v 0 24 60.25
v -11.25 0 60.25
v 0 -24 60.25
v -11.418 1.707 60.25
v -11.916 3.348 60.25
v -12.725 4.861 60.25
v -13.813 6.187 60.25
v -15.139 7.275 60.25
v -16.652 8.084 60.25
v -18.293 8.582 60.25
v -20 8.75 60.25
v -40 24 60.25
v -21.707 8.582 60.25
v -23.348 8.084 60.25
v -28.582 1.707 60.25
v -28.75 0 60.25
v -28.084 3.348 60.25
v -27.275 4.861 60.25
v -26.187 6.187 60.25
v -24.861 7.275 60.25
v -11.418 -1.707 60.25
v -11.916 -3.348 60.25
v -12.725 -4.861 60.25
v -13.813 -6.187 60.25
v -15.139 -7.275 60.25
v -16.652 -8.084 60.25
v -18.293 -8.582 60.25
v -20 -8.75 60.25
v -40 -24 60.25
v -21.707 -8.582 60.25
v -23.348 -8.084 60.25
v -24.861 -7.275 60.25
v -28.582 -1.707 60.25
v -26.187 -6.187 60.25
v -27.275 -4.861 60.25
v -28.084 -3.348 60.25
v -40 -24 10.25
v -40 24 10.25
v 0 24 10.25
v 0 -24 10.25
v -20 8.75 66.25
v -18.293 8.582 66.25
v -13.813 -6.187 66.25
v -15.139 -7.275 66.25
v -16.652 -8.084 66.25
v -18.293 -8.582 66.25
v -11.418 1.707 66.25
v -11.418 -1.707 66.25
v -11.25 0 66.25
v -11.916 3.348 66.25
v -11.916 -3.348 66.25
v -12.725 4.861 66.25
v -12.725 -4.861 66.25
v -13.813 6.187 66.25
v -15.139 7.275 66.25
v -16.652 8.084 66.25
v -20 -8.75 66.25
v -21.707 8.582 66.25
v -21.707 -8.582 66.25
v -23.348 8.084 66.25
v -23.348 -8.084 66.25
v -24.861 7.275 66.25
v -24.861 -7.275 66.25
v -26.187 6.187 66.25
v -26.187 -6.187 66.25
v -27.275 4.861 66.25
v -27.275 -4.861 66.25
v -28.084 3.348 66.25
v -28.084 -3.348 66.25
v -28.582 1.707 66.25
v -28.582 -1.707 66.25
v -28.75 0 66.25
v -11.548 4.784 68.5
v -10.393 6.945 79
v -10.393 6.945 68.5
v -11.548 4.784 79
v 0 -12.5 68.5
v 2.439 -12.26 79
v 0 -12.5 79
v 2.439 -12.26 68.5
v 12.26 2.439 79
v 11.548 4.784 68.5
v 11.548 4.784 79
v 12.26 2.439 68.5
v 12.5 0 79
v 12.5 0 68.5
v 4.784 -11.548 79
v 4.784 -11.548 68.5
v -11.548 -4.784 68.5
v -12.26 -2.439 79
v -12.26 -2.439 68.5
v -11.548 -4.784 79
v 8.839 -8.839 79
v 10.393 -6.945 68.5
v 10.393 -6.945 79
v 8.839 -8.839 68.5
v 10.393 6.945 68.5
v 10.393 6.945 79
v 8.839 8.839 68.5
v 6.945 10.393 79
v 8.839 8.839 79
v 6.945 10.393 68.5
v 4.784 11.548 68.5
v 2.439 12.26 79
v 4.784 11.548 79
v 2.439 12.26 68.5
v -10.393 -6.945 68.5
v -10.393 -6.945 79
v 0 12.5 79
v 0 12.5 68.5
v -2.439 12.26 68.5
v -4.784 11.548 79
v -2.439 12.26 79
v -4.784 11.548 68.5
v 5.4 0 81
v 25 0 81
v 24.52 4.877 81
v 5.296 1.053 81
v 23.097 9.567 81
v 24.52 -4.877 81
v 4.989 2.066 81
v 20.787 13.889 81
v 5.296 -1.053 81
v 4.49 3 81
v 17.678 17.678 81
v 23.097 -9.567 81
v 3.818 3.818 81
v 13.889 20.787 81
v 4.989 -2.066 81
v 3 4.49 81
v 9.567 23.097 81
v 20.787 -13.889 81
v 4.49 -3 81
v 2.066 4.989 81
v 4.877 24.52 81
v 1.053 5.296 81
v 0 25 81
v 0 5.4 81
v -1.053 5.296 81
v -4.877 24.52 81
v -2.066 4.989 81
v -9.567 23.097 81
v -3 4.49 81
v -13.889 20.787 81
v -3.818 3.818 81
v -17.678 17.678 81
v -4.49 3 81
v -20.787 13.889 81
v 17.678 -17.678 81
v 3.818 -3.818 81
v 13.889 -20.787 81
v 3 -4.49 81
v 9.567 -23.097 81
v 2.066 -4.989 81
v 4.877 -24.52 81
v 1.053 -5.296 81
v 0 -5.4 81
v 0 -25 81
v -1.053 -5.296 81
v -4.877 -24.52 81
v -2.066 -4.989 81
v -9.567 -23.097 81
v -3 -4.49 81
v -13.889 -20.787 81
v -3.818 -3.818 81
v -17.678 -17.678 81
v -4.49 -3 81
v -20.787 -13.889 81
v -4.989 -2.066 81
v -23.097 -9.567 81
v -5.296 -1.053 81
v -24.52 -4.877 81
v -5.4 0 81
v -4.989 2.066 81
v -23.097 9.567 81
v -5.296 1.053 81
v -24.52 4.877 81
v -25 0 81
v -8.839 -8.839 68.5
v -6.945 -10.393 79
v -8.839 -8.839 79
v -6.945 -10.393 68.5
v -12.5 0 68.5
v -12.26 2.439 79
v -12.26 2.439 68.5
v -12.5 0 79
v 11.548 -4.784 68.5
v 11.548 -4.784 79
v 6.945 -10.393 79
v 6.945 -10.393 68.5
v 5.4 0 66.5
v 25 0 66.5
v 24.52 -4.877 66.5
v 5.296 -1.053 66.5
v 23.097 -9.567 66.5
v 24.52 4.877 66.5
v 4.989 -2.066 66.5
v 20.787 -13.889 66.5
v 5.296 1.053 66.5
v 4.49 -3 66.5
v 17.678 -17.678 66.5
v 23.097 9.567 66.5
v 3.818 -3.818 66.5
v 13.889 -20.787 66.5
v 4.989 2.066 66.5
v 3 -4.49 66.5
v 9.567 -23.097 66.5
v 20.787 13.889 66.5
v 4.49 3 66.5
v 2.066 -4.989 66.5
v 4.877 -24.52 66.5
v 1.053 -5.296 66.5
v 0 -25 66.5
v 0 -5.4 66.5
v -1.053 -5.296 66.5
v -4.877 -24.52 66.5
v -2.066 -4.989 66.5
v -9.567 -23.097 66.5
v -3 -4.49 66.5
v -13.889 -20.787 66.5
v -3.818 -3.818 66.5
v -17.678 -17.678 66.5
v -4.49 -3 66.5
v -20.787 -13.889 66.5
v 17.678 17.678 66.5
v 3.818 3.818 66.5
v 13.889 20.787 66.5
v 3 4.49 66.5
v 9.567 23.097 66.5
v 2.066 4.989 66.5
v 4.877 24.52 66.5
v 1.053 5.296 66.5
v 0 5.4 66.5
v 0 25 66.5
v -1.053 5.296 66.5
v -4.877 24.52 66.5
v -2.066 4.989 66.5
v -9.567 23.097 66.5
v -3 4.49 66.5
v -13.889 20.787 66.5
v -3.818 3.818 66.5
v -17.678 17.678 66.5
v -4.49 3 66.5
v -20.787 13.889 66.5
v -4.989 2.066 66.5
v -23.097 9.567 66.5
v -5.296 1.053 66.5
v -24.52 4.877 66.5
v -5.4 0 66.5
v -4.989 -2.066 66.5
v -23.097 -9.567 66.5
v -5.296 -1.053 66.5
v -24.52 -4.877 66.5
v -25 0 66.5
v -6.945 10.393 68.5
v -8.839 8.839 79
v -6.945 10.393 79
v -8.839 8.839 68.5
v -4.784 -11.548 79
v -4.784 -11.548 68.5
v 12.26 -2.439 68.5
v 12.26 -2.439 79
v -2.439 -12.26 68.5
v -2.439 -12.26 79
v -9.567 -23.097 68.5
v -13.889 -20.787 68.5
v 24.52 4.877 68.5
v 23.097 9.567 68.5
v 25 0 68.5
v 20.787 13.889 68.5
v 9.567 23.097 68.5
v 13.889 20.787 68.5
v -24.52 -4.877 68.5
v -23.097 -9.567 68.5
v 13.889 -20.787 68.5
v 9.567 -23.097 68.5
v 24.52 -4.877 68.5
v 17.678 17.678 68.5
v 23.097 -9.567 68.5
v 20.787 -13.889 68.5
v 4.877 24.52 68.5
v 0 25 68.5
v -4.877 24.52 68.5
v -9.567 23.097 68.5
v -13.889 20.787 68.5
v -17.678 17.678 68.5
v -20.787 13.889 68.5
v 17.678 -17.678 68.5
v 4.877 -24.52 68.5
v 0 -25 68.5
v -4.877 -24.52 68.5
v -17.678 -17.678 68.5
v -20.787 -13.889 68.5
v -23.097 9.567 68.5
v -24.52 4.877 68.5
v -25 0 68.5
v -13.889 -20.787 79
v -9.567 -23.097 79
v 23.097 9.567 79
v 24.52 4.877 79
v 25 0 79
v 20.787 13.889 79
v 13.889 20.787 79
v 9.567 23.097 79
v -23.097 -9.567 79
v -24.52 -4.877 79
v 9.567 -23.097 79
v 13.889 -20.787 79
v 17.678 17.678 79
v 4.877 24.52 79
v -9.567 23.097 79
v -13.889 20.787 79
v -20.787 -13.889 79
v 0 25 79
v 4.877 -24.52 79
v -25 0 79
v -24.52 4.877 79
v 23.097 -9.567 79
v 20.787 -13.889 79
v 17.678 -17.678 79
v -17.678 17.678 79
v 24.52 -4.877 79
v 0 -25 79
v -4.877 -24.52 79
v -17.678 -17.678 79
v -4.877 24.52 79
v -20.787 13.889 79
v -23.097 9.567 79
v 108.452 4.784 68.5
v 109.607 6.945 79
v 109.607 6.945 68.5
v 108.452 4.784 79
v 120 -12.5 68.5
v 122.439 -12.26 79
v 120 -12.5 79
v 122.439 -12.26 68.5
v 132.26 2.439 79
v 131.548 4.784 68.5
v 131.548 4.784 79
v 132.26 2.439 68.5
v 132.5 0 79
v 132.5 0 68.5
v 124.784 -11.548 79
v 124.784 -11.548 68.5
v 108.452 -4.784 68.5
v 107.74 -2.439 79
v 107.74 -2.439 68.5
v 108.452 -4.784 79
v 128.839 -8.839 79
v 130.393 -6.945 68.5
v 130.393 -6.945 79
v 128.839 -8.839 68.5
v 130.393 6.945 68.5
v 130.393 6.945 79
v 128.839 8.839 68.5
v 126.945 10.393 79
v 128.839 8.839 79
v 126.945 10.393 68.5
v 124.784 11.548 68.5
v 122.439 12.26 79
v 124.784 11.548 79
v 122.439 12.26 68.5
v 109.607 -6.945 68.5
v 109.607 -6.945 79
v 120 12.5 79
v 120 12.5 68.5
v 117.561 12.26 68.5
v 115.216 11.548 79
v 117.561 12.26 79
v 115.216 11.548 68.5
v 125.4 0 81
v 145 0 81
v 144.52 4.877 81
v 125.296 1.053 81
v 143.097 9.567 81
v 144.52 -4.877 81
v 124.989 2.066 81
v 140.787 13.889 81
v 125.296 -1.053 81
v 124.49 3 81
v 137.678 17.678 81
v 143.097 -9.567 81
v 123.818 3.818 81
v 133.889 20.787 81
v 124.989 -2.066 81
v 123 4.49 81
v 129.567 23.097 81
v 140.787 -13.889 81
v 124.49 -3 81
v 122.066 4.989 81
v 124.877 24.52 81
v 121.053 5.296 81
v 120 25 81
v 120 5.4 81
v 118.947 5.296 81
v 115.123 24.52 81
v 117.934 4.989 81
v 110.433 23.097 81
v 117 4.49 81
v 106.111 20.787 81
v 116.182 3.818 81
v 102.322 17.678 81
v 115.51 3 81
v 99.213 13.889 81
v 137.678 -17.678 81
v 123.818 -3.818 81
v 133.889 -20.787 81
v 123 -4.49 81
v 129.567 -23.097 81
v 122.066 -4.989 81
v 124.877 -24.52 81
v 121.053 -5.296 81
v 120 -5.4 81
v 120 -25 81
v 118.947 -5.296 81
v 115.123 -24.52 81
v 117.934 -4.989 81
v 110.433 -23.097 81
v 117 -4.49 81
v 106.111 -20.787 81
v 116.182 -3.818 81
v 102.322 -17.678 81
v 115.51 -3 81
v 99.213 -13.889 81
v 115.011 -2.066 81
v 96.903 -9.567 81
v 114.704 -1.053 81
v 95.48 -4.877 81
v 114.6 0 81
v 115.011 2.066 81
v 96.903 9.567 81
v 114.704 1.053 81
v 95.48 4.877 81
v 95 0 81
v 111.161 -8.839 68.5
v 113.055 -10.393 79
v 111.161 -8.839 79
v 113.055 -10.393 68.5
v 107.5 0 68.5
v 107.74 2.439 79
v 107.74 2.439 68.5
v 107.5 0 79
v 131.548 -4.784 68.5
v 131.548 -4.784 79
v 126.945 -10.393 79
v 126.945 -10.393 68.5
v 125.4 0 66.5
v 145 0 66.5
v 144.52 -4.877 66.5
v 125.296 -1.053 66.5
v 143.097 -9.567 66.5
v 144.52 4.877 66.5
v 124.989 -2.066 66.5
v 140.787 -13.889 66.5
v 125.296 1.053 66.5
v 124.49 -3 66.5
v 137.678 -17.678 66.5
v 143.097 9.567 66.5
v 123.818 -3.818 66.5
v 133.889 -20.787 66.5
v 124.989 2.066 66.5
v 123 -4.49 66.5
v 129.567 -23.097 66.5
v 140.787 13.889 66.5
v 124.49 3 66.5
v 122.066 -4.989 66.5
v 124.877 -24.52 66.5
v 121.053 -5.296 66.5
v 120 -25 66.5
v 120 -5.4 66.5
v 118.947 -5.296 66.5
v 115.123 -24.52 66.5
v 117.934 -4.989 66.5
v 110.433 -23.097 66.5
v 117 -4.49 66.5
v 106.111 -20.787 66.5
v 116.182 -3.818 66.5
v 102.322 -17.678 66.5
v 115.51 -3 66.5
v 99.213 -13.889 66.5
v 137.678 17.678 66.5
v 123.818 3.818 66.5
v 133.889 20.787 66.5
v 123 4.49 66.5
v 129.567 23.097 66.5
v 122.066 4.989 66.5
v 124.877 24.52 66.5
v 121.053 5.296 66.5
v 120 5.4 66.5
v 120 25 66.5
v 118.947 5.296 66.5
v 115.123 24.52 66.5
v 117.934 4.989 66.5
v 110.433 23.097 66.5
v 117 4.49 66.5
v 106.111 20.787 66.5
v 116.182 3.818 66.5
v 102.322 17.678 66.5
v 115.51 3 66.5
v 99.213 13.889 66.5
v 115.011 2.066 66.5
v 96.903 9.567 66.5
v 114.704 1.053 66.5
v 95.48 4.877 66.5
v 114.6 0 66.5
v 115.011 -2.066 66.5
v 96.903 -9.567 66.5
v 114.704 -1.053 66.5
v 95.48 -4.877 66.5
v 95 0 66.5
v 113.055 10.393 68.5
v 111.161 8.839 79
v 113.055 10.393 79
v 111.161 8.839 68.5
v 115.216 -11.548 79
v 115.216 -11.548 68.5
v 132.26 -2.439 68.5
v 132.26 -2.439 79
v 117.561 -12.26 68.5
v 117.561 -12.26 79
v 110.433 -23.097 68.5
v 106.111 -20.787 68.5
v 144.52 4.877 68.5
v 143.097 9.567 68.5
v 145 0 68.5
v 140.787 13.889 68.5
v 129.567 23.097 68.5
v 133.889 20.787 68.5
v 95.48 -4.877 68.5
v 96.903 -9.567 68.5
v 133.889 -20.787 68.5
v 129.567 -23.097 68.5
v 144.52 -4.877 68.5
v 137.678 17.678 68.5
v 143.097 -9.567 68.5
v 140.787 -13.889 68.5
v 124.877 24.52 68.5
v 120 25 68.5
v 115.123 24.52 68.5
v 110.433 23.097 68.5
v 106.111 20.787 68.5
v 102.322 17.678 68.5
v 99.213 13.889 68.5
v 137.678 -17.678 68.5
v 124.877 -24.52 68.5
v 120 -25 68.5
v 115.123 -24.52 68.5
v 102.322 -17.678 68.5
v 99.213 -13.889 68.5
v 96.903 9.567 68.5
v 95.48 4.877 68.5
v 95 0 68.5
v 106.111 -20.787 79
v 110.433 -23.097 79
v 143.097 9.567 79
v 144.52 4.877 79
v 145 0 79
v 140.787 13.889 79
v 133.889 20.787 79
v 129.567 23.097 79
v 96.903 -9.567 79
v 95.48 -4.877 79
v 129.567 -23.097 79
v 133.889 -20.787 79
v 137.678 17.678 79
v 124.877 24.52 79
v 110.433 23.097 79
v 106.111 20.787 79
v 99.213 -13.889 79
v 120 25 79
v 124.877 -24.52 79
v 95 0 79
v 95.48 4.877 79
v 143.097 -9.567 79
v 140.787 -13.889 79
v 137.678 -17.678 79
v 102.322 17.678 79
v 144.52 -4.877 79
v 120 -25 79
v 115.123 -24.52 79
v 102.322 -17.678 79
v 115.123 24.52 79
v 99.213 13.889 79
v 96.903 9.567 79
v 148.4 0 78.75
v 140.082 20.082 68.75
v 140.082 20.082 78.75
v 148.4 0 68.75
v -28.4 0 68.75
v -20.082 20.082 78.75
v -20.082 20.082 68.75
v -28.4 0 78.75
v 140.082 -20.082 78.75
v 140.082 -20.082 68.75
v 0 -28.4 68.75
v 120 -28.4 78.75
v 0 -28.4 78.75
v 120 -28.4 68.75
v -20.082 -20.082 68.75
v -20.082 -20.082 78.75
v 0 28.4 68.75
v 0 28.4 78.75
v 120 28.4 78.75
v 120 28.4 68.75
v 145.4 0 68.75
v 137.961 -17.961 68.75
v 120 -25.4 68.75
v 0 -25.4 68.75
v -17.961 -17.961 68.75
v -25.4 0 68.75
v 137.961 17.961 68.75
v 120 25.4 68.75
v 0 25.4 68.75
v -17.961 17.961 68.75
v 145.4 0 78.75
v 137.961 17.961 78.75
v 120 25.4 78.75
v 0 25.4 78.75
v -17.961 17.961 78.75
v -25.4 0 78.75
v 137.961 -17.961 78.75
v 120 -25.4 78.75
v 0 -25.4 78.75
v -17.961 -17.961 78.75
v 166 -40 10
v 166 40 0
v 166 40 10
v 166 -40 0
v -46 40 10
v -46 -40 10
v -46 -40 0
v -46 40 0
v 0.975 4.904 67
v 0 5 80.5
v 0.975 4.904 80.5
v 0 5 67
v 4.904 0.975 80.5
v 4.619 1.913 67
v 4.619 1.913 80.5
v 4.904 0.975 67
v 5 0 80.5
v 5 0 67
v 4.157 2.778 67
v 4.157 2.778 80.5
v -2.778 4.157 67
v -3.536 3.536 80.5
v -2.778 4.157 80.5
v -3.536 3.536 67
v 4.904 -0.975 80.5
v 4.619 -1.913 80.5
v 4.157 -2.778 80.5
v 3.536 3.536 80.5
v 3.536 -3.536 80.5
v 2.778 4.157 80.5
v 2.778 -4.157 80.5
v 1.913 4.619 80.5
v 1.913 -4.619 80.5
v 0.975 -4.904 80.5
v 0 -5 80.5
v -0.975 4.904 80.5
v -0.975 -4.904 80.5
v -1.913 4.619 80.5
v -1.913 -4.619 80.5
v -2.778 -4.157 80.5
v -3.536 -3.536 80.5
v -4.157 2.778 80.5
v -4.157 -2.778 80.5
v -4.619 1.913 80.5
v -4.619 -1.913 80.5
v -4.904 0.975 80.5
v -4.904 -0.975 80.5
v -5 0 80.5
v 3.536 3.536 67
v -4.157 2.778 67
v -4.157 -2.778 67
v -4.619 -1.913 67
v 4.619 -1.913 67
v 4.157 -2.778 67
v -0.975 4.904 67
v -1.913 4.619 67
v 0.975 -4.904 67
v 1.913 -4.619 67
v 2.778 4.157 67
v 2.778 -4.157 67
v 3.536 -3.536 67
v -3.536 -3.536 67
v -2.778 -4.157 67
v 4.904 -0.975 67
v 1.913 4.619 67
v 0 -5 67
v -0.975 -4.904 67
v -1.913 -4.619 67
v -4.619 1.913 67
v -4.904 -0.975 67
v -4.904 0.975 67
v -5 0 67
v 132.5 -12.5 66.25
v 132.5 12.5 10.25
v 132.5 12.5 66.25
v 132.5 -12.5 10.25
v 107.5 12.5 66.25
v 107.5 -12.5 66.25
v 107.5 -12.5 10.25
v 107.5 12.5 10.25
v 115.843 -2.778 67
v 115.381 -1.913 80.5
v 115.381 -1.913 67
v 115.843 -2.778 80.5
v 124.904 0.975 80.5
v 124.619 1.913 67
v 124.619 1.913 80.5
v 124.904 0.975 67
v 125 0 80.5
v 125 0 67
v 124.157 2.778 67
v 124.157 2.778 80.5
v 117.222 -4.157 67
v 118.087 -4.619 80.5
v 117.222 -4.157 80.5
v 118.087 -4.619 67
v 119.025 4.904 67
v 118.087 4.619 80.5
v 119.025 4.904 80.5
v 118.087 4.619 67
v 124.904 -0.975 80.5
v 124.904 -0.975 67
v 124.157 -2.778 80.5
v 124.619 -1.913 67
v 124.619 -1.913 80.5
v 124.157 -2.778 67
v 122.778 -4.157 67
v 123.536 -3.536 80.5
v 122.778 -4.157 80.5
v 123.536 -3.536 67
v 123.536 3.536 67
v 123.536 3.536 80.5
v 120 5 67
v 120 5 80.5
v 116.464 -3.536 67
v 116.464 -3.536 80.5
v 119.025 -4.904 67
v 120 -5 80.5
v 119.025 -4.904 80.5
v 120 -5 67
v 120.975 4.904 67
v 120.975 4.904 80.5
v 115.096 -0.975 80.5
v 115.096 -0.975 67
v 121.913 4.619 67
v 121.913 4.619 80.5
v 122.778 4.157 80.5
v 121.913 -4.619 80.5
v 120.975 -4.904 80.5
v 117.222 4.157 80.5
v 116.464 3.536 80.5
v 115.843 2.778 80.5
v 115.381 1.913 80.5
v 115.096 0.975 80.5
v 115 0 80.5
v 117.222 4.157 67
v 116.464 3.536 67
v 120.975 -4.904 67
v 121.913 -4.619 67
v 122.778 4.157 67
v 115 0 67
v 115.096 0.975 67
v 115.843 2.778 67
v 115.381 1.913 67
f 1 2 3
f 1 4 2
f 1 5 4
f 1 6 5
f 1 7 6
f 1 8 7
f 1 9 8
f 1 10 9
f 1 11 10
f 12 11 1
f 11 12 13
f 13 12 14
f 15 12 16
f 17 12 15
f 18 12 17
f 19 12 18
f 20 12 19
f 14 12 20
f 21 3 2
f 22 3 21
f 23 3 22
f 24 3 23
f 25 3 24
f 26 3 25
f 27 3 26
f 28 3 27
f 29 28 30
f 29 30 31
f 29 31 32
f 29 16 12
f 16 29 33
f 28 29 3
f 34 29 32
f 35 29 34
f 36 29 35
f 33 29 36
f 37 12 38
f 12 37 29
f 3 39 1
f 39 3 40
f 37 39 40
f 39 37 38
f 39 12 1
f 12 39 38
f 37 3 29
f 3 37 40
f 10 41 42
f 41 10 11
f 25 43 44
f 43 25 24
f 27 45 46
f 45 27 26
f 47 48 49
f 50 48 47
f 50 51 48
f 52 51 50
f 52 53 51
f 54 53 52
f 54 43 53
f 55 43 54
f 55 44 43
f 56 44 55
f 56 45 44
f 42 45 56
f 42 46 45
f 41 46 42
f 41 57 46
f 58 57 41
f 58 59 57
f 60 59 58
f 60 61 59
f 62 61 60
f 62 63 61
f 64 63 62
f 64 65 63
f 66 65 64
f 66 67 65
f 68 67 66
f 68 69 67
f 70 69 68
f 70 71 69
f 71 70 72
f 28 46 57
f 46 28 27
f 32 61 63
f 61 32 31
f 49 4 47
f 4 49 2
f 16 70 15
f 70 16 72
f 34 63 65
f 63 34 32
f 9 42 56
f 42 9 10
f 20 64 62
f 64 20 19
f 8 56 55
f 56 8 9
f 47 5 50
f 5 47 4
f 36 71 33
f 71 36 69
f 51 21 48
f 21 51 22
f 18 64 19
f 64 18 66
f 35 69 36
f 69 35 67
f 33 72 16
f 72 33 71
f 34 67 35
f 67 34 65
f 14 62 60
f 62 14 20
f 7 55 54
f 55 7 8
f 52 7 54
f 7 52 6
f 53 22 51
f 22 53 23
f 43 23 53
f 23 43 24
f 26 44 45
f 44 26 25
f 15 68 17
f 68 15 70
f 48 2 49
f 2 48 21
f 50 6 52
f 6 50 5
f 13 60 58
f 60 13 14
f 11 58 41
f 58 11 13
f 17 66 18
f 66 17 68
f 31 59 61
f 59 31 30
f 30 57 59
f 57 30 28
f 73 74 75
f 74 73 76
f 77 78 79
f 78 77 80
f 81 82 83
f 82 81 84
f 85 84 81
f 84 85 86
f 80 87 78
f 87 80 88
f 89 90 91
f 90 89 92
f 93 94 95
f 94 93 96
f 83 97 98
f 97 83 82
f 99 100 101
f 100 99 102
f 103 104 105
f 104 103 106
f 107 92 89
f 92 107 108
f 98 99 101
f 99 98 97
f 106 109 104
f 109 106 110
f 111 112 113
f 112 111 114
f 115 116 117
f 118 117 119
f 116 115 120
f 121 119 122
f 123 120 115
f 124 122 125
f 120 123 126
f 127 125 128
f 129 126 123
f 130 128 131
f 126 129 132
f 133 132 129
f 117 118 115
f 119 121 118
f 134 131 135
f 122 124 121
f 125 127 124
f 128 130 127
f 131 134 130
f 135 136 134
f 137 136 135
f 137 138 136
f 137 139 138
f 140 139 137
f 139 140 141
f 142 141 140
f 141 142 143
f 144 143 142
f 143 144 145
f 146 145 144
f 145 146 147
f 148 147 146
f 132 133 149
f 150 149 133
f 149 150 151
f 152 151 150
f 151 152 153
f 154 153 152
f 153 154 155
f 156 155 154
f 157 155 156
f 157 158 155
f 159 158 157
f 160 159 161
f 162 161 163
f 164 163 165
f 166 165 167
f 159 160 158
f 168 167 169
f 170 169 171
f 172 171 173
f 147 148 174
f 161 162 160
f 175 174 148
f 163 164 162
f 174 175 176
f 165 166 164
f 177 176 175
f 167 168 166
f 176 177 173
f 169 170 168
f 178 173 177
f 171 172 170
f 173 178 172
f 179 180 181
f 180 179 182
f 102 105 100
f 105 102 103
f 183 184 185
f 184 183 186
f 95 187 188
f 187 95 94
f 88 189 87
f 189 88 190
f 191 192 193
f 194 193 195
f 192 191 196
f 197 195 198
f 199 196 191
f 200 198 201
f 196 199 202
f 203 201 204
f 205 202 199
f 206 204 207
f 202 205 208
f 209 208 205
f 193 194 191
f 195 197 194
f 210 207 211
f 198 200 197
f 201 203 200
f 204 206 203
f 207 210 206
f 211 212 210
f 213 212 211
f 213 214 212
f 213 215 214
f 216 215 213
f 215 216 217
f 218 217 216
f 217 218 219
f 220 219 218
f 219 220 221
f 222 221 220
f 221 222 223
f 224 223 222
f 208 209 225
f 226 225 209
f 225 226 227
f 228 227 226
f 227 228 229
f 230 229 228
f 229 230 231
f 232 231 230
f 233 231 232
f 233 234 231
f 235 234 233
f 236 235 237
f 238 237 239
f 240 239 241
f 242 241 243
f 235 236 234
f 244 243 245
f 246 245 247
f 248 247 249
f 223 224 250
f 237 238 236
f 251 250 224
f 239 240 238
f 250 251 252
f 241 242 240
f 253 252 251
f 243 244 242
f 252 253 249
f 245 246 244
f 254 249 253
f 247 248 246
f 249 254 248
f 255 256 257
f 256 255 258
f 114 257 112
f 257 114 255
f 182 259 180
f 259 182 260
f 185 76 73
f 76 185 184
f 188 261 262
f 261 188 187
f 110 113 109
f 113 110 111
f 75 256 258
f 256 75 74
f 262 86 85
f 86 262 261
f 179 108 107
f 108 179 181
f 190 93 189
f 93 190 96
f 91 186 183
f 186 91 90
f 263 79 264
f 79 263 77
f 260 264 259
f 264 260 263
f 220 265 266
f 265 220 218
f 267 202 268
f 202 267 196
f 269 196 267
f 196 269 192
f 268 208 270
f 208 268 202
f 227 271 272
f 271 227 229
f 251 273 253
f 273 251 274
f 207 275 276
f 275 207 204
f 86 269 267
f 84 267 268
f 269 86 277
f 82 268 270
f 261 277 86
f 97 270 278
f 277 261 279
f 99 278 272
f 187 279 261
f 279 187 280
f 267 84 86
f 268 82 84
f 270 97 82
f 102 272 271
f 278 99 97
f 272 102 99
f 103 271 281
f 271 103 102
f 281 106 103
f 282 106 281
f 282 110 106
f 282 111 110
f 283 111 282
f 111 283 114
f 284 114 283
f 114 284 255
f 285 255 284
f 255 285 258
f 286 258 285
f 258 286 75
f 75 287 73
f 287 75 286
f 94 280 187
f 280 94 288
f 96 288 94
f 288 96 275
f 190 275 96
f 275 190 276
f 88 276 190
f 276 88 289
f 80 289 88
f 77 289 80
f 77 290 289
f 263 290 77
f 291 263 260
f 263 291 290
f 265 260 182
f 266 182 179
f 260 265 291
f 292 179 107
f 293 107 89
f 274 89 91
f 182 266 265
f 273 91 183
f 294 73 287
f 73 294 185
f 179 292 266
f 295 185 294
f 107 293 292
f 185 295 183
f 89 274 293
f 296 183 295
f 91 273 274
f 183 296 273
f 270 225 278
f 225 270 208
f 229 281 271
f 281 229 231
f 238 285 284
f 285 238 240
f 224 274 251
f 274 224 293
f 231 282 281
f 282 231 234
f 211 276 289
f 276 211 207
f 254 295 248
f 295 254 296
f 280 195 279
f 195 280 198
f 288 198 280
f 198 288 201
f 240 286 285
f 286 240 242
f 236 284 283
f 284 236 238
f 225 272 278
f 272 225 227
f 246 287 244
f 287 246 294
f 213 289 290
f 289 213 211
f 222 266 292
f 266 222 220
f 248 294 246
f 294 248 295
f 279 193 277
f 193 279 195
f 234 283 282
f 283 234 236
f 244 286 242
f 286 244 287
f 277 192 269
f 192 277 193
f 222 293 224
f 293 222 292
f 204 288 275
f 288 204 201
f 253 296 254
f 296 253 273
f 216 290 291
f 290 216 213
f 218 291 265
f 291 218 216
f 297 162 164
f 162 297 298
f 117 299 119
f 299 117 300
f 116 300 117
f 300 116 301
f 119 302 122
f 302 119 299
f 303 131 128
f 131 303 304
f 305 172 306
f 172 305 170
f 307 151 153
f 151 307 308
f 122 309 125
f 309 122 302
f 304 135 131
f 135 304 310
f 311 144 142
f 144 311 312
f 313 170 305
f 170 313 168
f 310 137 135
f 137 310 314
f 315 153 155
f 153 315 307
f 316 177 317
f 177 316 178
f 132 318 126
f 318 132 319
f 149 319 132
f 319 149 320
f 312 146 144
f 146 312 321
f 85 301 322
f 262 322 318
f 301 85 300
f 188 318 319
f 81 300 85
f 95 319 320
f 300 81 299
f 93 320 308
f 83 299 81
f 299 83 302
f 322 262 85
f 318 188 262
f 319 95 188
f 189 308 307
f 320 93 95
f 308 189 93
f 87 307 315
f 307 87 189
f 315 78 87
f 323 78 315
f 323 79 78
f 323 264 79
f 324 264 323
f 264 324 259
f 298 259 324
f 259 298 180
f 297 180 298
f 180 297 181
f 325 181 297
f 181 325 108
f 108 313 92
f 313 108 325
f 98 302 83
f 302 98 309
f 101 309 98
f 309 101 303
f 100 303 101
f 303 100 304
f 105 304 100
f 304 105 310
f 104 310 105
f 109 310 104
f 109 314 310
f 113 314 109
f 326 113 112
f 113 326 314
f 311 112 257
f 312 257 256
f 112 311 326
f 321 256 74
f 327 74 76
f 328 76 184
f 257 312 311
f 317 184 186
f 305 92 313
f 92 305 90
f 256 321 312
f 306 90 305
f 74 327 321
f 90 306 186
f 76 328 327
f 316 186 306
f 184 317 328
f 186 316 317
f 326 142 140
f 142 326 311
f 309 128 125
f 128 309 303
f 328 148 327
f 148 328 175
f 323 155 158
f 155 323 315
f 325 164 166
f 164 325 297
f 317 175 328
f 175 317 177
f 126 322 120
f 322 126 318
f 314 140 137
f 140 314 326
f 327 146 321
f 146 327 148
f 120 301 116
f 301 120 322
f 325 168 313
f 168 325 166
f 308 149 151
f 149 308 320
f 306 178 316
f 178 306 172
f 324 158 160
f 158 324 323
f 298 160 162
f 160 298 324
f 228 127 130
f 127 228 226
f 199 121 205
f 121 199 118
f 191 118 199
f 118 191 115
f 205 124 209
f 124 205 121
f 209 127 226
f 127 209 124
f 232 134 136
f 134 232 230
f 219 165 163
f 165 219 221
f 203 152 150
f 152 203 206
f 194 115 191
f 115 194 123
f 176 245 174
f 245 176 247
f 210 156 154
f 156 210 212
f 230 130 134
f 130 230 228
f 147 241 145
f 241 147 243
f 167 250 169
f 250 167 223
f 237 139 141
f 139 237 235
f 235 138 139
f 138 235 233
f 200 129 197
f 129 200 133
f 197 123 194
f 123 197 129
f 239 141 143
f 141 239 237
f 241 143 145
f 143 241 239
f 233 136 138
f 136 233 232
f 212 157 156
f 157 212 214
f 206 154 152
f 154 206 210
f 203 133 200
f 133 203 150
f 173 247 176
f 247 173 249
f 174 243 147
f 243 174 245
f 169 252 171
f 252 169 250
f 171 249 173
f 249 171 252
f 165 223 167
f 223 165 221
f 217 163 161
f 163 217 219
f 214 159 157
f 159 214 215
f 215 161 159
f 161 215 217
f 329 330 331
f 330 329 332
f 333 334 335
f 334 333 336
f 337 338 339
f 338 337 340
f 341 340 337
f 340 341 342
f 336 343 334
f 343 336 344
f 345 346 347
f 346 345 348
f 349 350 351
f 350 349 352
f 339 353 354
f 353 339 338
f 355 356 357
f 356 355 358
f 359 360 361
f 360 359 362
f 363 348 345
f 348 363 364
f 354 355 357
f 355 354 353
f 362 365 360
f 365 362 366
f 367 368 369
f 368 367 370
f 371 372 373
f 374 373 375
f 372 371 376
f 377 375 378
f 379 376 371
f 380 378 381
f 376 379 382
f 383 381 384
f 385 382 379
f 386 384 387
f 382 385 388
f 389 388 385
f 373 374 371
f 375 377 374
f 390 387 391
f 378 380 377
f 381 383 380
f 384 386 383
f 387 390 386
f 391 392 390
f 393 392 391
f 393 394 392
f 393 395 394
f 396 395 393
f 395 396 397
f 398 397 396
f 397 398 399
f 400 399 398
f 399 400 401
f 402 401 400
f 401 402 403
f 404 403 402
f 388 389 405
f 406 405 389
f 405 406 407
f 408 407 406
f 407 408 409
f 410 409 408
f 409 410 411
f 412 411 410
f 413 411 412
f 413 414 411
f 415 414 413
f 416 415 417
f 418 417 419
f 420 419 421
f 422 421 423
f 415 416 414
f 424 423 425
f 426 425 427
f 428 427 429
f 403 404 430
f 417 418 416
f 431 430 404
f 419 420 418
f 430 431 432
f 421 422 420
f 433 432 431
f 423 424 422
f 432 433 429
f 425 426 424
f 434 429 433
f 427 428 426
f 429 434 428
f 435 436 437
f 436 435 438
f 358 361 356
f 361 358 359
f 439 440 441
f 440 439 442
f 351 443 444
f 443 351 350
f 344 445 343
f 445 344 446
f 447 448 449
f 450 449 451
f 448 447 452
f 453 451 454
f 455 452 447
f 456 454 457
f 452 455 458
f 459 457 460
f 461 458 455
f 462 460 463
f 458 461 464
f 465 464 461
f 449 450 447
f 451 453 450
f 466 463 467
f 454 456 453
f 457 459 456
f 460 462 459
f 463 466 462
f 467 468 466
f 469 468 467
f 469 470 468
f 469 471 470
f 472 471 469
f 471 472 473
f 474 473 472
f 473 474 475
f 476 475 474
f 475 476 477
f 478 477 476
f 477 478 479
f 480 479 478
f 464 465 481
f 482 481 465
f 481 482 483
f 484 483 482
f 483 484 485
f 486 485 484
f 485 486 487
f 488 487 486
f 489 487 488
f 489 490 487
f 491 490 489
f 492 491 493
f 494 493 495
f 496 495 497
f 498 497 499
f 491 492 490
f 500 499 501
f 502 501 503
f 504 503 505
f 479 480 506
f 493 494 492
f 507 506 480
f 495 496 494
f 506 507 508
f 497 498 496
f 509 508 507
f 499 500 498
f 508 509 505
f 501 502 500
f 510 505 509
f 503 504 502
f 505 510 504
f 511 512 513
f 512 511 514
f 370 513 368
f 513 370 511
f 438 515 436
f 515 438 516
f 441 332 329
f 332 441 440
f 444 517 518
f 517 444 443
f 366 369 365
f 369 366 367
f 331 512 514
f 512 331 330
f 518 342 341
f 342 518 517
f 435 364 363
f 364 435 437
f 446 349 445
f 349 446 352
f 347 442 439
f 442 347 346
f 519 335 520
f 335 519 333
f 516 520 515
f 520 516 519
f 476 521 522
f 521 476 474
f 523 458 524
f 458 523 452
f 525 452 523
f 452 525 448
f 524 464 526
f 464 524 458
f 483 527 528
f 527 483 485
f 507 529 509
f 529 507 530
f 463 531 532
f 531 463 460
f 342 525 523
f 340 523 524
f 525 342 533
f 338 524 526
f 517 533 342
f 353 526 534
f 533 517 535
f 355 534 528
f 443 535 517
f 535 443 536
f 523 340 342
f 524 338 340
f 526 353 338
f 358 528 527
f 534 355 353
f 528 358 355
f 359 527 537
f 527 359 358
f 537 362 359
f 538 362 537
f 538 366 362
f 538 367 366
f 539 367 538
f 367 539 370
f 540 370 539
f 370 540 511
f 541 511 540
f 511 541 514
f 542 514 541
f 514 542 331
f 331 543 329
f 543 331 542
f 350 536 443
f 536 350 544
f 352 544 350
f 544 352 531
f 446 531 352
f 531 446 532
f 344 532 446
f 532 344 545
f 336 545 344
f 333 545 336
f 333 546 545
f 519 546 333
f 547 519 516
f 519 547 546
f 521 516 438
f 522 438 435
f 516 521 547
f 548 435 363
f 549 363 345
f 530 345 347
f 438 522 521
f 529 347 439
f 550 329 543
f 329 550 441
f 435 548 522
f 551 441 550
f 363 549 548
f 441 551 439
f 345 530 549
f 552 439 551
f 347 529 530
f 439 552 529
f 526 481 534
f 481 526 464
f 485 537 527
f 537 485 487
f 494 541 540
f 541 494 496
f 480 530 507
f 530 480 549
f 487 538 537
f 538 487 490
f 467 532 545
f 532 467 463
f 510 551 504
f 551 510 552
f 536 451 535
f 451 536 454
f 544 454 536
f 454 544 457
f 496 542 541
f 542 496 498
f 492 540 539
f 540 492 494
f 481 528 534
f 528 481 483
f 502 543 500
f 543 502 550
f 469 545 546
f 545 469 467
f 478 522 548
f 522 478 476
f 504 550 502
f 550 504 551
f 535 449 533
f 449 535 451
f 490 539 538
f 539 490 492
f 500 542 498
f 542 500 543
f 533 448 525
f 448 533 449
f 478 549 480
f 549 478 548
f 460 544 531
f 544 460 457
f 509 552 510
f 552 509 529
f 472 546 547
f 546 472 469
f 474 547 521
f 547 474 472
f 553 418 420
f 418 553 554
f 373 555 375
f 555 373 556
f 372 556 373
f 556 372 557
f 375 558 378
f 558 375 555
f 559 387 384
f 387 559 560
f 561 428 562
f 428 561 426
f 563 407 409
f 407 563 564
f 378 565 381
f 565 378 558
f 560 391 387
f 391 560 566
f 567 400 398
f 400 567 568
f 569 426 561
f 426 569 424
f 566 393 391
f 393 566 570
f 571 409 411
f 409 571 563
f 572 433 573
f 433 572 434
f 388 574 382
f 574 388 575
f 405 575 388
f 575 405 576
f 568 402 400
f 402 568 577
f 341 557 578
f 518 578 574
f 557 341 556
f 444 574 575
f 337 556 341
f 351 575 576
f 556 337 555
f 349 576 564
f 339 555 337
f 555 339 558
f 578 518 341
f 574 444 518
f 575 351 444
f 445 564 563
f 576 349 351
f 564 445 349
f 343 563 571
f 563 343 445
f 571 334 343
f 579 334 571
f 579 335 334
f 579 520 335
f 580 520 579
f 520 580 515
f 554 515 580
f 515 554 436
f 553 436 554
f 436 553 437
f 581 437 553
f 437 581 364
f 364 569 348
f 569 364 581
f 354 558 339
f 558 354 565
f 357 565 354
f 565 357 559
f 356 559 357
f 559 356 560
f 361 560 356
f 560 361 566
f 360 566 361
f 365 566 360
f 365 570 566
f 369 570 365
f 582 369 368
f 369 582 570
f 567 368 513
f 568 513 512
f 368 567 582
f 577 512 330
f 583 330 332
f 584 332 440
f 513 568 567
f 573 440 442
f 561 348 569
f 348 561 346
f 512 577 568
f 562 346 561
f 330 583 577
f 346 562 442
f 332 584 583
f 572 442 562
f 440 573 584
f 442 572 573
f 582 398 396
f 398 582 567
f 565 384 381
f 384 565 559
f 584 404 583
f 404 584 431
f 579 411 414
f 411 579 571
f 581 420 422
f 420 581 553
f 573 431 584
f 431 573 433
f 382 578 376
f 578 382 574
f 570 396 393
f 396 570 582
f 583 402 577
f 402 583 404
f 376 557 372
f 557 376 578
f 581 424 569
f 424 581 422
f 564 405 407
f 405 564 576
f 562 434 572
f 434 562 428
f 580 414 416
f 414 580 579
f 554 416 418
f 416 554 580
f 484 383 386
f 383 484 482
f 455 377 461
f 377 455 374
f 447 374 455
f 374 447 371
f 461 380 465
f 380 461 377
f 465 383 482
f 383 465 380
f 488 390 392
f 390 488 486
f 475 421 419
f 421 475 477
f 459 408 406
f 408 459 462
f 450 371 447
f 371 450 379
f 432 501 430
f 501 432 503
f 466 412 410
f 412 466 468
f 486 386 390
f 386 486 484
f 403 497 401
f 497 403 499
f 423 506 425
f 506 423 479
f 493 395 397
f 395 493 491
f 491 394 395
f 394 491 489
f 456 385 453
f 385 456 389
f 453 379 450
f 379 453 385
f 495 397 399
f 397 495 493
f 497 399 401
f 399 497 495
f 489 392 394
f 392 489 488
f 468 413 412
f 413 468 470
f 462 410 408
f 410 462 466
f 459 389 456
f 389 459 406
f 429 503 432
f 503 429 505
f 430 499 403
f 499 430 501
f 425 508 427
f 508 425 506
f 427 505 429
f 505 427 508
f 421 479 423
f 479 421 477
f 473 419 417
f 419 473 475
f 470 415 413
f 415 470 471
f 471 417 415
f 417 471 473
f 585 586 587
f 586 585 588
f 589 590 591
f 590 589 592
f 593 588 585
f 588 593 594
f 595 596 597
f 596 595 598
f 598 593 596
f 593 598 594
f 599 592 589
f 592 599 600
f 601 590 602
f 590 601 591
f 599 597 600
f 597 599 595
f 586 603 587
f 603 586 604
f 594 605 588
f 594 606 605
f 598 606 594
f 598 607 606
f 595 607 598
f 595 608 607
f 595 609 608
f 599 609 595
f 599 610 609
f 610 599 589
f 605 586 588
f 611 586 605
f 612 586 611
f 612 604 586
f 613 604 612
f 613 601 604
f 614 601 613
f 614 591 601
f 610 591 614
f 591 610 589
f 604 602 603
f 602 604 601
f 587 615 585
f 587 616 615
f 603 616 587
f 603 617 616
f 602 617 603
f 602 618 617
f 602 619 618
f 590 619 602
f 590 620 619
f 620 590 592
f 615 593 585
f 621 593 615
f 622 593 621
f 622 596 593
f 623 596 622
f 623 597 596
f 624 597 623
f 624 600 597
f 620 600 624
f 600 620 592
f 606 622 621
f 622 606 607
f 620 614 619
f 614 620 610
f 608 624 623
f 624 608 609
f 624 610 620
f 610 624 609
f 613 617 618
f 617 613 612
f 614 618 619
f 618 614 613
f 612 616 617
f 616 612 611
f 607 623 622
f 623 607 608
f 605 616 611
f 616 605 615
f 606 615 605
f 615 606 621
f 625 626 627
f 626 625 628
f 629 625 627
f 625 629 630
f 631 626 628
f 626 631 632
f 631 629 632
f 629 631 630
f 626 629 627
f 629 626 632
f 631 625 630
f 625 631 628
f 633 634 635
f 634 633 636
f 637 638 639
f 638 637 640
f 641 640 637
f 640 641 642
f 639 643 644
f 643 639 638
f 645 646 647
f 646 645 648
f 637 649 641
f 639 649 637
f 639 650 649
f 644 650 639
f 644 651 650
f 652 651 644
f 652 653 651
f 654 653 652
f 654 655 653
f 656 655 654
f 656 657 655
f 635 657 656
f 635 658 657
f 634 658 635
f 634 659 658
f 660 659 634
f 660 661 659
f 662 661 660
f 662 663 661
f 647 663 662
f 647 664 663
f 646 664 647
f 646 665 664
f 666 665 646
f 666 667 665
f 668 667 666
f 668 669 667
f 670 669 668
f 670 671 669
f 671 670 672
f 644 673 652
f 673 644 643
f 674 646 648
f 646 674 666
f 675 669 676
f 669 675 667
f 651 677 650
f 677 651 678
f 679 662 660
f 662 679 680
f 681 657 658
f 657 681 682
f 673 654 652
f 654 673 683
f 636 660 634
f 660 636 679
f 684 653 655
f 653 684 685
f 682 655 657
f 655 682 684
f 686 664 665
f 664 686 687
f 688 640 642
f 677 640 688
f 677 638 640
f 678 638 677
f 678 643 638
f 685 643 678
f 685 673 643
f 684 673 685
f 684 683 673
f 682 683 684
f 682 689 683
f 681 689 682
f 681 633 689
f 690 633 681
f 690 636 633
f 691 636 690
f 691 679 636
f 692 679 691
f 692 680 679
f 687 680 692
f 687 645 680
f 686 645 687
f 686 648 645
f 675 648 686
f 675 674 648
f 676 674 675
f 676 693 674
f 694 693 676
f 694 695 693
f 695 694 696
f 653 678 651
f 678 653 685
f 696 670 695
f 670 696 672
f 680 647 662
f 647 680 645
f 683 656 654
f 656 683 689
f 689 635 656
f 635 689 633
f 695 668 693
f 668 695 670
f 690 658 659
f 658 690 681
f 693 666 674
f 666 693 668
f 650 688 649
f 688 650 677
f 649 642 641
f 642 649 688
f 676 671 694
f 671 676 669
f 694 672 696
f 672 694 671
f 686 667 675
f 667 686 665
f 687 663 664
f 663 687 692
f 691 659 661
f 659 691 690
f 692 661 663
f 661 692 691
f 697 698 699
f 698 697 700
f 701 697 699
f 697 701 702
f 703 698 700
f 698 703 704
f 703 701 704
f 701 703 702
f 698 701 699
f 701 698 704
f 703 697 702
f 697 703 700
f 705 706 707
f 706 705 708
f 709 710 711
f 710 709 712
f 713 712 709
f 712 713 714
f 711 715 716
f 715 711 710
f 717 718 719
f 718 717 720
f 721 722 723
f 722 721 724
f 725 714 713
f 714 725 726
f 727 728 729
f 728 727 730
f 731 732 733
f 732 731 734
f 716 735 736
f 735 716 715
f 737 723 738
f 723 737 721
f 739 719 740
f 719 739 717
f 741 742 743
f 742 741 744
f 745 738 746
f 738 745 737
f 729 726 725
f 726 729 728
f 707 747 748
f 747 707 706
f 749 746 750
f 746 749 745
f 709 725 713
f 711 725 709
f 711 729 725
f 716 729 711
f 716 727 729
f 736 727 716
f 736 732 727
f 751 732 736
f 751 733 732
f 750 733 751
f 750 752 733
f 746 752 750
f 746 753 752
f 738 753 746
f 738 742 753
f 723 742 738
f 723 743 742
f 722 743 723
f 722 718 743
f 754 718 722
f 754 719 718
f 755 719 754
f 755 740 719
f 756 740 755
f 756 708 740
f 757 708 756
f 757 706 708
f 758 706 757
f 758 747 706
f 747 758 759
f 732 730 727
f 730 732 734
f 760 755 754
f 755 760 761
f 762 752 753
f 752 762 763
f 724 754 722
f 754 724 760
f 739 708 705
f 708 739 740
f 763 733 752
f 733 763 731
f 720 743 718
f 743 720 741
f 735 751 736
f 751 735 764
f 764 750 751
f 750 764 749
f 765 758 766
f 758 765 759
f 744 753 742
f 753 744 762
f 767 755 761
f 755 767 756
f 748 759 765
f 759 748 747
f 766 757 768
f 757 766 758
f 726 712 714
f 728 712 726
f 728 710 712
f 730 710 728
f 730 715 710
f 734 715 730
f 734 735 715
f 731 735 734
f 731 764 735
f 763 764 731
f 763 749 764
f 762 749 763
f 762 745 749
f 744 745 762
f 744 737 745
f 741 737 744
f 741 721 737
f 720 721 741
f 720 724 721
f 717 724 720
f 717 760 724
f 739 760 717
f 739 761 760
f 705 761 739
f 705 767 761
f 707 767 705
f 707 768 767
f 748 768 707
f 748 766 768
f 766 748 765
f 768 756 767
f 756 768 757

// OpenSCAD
$fn = 32;

// ------------------------------------------------------------------------
// Motor belt drive: span 120 mm, pulleys d50, belt 10 mm wide
// Every part is its own module, assembly() places every instance.
// ------------------------------------------------------------------------

// --- part 1 ---
module base_plate() {
  difference() {
    translate([-106, -40, 0]) cube([212, 80, 10]);
  }
}

// --- part 2 ---
module motor() {
  union() {
    translate([-25, -24, 0]) cube([50, 48, 40]);
    translate([28, 0, 20]) rotate([0, 90, 0]) cylinder(h = 6, d = 17.5, center = true);
  }
}

// --- part 3 ---
module drive_shaft() {
  translate([0, 0, -6.75]) cylinder(h = 13.5, d = 10);
}

// --- part 4 ---
module pulley_drive() {
  difference() {
    union() {
      cylinder(h = 14.5, d = 25);
      cylinder(h = 2, d = 50);
      translate([0, 0, 12.5]) cylinder(h = 2, d = 50);
    }
    translate([0, 0, -1]) cylinder(h = 16.5, d = 10.8);
  }
}

// --- part 5 ---
module idler_post() {
  translate([-12.5, -12.5, 0]) cube([25, 25, 56]);
}

// --- part 6 ---
module driven_shaft() {
  translate([0, 0, -6.75]) cylinder(h = 13.5, d = 10);
}

// --- part 7 ---
module pulley_driven() {
  difference() {
    union() {
      cylinder(h = 14.5, d = 25);
      cylinder(h = 2, d = 50);
      translate([0, 0, 12.5]) cylinder(h = 2, d = 50);
    }
    translate([0, 0, -1]) cylinder(h = 16.5, d = 10.8);
  }
}

// --- part 8 ---
module drive_belt() {
  difference() {
    linear_extrude(height = 10) polygon(points = concat([for (a = [90 : 45 : 270]) [28.4 * cos(a), 28.4 * sin(a)]], [for (a = [270 : 45 : 450]) [120 + 28.4 * cos(a), 28.4 * sin(a)]]));
    translate([0, 0, -1]) linear_extrude(height = 12) polygon(points = concat([for (a = [90 : 45 : 270]) [25.4 * cos(a), 25.4 * sin(a)]], [for (a = [270 : 45 : 450]) [120 + 25.4 * cos(a), 25.4 * sin(a)]]));
  }
}

// --- assembly ---
module assembly() {
  color([0.80, 0.24, 0.20]) translate([60, 0, 0]) rotate([0, 0, 0]) base_plate();
  color([0.20, 0.45, 0.75]) translate([0, 0, 35.25]) rotate([0, 270, 0]) motor();
  color([0.25, 0.62, 0.32]) translate([0, 0, 73.75]) rotate([0, 0, 0]) drive_shaft();
  color([0.92, 0.70, 0.18]) translate([0, 0, 66.5]) rotate([0, 0, 0]) pulley_drive();
  color([0.58, 0.35, 0.70]) translate([120, 0, 10.25]) rotate([0, 0, 0]) idler_post();
  color([0.16, 0.66, 0.66]) translate([120, 0, 73.75]) rotate([0, 0, 0]) driven_shaft();
  color([0.85, 0.48, 0.18]) translate([120, 0, 66.5]) rotate([0, 0, 0]) pulley_driven();
  color([0.55, 0.60, 0.65]) translate([0, 0, 68.75]) rotate([0, 0, 0]) drive_belt();
}

assembly();
